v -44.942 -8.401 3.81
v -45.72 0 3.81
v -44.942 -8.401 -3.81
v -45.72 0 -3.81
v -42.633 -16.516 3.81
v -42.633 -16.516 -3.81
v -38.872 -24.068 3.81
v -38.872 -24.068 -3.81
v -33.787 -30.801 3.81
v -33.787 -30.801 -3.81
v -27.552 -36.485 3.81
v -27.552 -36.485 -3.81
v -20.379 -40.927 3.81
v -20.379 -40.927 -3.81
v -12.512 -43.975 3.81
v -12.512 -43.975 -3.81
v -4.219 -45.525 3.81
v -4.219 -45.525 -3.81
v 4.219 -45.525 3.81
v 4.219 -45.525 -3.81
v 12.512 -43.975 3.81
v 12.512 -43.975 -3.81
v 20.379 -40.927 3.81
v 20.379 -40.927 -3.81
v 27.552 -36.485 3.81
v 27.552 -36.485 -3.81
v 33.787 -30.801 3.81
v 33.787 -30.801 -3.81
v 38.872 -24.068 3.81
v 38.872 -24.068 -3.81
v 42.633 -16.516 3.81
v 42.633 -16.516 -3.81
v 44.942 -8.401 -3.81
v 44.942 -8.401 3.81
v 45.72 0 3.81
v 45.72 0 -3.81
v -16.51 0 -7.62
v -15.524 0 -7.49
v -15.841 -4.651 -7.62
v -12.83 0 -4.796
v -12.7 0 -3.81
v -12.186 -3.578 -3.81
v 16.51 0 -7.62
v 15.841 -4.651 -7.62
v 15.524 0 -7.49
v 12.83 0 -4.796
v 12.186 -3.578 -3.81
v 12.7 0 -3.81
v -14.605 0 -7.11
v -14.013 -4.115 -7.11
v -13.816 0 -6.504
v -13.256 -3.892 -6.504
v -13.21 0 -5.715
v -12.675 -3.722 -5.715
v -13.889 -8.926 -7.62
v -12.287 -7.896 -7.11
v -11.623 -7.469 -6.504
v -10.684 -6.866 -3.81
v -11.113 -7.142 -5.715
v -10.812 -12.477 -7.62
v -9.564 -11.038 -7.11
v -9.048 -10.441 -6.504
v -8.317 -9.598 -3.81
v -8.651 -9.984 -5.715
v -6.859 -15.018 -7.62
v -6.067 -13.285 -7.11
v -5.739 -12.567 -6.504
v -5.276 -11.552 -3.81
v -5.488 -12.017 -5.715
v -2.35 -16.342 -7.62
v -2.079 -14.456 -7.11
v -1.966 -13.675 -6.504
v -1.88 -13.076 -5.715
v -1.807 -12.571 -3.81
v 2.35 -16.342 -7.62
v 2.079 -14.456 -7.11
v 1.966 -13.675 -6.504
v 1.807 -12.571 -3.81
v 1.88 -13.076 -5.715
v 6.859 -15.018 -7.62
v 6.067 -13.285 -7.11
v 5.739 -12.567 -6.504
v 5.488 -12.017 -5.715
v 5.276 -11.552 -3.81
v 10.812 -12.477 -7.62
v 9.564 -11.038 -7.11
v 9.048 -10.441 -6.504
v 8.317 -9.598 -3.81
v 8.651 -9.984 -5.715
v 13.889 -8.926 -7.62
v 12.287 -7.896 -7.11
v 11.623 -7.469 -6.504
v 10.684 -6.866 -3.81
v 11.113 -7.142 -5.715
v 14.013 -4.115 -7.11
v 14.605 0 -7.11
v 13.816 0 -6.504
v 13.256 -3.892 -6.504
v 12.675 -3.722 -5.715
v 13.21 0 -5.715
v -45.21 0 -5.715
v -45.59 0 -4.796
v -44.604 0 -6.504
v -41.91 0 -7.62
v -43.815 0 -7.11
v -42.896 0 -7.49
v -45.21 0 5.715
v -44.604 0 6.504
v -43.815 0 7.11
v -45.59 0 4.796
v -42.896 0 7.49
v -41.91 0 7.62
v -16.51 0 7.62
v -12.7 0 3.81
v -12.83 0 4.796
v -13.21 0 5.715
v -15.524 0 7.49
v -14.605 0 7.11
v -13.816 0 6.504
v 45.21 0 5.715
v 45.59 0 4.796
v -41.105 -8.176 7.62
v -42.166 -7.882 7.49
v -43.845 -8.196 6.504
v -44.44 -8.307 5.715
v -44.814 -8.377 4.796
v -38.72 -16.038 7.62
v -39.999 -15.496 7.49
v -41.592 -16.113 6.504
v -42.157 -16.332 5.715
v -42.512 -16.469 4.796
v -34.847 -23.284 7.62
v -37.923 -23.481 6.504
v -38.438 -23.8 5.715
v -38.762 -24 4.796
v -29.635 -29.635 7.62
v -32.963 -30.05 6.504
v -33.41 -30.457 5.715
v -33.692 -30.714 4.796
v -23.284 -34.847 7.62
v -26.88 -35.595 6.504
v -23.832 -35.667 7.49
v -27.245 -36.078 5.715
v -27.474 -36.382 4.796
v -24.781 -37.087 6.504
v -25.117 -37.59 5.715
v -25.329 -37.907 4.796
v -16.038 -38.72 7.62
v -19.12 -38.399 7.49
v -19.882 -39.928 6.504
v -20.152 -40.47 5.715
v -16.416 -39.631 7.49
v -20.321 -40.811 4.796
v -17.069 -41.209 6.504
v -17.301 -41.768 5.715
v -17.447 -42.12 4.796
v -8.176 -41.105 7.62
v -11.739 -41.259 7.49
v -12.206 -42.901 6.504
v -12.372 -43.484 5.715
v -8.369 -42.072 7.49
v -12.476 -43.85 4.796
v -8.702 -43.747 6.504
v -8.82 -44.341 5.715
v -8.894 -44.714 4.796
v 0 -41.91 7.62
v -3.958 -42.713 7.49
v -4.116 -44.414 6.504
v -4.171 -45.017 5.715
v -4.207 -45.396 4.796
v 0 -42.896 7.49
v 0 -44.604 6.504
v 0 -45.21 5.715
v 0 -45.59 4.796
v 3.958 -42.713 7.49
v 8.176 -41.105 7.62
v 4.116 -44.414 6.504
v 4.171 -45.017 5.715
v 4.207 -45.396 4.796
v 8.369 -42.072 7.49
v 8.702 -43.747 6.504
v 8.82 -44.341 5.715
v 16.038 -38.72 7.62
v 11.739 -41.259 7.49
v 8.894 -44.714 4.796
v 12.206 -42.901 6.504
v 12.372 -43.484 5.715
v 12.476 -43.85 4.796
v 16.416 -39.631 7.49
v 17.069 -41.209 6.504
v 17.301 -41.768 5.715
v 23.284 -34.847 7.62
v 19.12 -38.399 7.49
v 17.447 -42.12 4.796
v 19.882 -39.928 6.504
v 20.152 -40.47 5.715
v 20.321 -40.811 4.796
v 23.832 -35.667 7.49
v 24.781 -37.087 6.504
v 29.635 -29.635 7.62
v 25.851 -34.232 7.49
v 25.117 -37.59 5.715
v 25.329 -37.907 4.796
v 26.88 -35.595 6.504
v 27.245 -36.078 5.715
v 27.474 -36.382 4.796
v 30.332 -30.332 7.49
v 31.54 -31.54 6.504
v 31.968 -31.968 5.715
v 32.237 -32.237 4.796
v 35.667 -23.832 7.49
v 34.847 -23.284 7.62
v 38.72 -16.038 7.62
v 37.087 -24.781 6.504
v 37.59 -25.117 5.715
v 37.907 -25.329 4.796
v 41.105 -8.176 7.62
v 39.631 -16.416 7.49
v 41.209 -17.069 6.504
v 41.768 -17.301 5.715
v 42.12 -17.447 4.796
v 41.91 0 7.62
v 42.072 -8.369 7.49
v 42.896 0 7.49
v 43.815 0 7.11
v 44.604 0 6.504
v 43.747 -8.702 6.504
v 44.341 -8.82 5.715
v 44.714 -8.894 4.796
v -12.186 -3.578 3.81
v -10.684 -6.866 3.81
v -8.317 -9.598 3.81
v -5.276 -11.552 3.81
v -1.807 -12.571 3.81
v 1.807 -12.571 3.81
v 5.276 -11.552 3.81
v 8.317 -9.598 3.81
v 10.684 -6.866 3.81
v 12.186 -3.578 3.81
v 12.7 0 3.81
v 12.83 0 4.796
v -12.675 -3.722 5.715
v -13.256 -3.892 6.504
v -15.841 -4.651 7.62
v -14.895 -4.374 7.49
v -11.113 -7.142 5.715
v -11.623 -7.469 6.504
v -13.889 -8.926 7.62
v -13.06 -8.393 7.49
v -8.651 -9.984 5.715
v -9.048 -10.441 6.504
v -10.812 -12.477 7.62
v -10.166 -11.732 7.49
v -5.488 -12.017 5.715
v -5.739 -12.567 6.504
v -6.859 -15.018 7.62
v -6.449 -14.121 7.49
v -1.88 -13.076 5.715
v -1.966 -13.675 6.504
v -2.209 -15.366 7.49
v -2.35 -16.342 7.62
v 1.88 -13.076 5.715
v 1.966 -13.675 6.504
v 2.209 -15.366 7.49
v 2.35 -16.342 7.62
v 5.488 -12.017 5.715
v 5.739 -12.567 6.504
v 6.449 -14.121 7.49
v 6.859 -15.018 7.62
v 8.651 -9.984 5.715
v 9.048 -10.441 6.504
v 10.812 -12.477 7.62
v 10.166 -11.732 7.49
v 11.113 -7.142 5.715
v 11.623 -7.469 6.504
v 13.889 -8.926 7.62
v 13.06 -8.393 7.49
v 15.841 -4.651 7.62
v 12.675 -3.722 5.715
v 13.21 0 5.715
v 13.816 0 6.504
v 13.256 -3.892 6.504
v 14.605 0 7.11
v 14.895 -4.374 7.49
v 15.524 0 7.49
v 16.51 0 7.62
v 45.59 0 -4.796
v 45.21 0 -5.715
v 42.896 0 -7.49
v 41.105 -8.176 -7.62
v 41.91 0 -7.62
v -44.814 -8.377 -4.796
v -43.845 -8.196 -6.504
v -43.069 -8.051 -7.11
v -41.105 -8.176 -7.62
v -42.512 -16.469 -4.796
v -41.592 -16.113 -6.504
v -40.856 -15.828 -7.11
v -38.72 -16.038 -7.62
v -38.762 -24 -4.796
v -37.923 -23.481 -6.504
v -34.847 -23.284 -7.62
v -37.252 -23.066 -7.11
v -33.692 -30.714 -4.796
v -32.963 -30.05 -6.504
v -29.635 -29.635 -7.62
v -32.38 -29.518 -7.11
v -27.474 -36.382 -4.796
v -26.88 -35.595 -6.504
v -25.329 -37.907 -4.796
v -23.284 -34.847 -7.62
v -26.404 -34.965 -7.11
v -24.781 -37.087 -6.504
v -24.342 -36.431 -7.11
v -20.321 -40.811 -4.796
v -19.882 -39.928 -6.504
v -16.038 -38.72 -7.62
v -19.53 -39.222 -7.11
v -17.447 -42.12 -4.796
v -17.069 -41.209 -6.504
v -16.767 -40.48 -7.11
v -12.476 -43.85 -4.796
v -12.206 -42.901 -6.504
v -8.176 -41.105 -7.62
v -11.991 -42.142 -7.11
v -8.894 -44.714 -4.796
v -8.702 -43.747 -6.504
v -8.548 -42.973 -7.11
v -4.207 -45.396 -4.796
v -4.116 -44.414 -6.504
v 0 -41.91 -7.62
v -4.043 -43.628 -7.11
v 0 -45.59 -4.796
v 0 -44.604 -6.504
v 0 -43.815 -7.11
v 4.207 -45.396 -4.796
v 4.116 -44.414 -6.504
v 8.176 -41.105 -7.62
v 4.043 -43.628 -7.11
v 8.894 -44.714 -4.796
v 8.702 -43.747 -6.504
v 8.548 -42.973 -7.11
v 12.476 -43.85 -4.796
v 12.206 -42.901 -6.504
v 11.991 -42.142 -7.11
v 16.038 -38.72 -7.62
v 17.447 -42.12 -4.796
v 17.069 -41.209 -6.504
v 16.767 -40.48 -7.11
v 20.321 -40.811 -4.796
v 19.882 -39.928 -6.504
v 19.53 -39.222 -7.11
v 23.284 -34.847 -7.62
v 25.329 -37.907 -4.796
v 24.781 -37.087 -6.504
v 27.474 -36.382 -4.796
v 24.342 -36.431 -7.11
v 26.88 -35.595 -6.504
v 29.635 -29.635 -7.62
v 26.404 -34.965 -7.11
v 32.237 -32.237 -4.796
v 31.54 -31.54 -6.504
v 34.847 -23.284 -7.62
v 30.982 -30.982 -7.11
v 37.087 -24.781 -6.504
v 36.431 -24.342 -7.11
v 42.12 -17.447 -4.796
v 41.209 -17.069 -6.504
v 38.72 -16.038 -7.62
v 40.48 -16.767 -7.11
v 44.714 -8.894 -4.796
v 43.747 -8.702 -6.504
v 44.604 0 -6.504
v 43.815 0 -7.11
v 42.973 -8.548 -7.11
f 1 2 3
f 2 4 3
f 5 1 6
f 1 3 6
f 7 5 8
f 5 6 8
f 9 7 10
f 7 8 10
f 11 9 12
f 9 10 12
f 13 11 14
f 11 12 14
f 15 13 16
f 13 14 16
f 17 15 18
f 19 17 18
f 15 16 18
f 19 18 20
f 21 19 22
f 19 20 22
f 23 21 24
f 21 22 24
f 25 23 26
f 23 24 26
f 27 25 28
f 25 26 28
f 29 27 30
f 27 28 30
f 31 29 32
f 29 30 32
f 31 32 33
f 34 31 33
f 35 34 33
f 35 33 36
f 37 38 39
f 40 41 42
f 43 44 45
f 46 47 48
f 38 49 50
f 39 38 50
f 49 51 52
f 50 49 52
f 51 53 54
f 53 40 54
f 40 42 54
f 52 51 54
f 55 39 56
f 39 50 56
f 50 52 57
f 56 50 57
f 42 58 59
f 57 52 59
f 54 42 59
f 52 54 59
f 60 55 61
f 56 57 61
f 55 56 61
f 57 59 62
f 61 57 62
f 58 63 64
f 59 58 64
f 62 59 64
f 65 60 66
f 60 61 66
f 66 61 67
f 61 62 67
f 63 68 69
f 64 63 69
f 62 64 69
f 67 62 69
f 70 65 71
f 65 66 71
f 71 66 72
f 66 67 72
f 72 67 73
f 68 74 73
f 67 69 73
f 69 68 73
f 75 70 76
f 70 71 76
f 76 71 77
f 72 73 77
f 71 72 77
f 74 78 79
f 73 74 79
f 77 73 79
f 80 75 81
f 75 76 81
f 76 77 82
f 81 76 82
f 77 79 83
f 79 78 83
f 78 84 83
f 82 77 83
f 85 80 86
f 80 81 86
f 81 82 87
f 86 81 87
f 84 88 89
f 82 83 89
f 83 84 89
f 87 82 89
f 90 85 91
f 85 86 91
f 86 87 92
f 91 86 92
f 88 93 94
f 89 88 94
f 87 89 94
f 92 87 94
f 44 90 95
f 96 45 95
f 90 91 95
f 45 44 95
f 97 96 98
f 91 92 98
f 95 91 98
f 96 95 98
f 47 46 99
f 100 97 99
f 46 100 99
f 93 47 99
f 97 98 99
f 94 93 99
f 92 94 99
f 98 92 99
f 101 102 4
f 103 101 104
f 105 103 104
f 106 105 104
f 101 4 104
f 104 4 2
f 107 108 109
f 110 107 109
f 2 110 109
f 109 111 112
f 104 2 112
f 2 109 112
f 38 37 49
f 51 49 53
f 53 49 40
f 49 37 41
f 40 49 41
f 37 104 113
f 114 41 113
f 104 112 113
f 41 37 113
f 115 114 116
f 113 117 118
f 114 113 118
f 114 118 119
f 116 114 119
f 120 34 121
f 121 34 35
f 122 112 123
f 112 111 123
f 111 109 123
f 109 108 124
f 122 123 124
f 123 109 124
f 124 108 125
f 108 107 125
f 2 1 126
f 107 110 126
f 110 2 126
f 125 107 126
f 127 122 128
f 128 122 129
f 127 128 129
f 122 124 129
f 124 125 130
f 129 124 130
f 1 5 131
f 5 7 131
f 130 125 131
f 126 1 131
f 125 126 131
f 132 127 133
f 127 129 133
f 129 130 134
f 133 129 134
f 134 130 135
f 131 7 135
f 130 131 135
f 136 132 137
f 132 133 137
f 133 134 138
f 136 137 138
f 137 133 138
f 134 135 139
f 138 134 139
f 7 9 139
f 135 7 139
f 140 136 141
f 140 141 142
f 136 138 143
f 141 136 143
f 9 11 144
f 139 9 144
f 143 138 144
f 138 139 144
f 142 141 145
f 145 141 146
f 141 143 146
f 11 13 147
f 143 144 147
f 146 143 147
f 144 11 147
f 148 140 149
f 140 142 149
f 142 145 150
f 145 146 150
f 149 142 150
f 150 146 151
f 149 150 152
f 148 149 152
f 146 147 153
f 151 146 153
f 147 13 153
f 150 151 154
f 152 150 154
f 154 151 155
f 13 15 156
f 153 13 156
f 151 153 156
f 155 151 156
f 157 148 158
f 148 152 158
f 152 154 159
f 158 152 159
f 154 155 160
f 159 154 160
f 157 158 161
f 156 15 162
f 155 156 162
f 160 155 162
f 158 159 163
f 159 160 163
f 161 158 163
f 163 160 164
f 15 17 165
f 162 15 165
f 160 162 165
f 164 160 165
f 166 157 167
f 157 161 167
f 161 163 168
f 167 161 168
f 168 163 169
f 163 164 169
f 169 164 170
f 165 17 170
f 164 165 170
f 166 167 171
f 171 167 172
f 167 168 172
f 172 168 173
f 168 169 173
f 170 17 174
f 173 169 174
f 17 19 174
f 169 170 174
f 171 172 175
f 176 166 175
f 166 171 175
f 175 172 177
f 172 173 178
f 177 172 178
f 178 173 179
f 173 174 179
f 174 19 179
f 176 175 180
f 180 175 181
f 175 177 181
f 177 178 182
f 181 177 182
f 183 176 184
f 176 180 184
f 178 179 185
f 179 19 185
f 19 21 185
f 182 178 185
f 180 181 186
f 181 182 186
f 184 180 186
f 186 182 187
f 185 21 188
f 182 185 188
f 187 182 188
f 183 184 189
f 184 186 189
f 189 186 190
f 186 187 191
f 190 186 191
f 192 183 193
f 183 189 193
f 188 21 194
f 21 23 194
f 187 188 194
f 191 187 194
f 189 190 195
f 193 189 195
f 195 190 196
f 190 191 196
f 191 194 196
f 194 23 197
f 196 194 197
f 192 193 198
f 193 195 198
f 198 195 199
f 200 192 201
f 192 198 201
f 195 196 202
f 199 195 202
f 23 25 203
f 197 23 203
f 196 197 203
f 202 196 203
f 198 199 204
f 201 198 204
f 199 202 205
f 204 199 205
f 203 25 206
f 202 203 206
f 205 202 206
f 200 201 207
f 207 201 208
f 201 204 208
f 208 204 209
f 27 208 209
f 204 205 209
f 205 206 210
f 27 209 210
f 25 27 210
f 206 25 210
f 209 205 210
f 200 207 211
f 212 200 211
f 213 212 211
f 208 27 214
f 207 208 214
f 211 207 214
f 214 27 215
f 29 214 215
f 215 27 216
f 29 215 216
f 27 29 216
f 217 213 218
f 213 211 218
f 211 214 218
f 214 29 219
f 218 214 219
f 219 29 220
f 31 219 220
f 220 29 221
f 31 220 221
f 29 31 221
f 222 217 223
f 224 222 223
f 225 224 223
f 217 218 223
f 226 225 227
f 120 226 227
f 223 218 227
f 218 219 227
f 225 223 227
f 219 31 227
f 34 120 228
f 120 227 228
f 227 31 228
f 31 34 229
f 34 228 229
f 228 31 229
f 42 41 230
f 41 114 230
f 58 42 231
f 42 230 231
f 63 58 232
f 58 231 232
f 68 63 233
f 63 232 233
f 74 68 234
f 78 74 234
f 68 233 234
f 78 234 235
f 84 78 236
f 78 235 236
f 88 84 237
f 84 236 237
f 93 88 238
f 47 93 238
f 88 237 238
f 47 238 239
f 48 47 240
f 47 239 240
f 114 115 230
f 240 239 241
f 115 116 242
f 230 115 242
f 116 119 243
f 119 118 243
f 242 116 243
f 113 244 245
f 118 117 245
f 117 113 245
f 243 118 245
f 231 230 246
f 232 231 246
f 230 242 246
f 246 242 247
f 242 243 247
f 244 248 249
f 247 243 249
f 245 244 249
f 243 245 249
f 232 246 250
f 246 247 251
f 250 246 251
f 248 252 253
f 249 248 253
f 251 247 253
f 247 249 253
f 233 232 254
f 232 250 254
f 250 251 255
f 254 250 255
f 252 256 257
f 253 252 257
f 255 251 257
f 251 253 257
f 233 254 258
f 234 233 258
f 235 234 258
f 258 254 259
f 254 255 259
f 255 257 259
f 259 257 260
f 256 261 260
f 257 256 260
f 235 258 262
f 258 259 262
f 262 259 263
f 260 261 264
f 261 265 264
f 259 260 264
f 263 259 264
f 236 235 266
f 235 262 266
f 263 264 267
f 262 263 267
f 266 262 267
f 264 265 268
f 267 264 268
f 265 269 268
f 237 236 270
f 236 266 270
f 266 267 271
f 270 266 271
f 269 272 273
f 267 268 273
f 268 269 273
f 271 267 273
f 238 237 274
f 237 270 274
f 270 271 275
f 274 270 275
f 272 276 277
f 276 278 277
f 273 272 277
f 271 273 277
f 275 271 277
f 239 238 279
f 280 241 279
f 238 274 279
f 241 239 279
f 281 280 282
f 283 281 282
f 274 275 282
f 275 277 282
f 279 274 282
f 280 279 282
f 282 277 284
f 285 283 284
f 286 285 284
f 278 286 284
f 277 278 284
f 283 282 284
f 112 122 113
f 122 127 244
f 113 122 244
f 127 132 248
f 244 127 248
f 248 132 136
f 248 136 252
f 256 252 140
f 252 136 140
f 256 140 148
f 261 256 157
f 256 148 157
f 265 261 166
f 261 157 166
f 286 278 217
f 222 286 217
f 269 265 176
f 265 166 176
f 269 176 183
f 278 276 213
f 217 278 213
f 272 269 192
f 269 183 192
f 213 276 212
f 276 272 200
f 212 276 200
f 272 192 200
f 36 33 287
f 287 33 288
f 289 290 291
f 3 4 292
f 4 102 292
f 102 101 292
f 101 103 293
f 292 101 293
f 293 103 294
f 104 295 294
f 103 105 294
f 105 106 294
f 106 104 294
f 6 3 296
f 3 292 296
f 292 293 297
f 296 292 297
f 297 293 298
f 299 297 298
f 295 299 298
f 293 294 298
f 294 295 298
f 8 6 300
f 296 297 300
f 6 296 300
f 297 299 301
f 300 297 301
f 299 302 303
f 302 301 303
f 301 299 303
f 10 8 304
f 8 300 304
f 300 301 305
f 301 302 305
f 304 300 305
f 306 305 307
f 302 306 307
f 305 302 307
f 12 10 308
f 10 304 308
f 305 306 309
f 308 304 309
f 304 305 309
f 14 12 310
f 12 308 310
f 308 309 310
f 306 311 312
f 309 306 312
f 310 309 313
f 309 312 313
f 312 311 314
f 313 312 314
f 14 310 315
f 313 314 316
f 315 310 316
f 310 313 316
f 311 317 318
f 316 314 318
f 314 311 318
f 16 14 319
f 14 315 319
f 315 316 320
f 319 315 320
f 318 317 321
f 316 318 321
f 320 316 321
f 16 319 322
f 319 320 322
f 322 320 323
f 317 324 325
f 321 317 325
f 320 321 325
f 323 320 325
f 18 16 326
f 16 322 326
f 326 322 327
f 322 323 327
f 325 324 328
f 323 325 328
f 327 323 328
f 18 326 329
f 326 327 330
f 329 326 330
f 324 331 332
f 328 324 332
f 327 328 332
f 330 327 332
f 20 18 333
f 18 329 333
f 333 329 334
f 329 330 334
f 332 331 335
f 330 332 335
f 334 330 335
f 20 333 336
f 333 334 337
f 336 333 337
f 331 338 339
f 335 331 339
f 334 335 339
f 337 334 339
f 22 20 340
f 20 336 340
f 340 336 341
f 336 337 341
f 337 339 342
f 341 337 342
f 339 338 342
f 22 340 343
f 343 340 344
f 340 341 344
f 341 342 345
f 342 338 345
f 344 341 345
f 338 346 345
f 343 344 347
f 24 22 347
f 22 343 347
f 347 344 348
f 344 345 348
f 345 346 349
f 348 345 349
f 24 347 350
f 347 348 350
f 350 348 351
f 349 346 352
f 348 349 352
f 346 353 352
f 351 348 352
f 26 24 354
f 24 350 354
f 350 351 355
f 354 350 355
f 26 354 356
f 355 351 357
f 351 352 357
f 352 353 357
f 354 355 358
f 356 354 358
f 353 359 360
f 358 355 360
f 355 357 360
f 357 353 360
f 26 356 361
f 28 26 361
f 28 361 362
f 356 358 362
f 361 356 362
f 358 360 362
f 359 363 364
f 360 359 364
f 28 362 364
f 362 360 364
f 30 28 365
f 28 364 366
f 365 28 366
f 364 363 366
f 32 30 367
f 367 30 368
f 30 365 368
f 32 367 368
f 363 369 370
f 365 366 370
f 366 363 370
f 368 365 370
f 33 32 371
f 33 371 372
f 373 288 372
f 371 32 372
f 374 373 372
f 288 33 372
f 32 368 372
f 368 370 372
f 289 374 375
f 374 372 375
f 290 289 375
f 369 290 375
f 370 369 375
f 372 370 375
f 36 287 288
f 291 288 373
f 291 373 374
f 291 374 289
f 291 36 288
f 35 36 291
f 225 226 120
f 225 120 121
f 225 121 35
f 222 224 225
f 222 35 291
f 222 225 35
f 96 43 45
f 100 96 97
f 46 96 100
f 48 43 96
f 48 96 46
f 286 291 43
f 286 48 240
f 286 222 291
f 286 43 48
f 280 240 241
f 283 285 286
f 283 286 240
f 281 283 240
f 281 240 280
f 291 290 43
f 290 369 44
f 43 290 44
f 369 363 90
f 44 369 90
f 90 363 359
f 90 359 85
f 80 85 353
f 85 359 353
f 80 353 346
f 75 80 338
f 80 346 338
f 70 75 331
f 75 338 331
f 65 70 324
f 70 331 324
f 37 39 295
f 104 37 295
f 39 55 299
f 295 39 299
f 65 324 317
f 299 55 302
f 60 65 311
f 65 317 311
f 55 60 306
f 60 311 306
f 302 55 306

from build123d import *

# Parameters (mm, degrees)
F1_ANGLE = 180


with BuildPart() as f1:
    # F0 (on Front) → F1 (revolve)
    with BuildSketch(Plane.XZ):
        with BuildLine():
            Line((-16.51, 7.62), (-41.91, 7.62))
            ThreePointArc((-41.91, 7.62), (-44.604077, 6.504077), (-45.72, 3.81))
            Line((-45.72, 3.81), (-45.72, -3.81))
            ThreePointArc((-45.72, -3.81), (-44.604077, -6.504077), (-41.91, -7.62))
            Line((-41.91, -7.62), (-16.51, -7.62))
            ThreePointArc((-16.51, -7.62), (-13.815923, -6.504077), (-12.7, -3.81))
            Line((-12.7, -3.81), (-12.7, 3.81))
            ThreePointArc((-12.7, 3.81), (-13.815923, 6.504077), (-16.51, 7.62))
        make_face()
    revolve(axis=Axis((0, 0, 0), (0, 0, 1)), revolution_arc=F1_ANGLE)


solid = f1.part
